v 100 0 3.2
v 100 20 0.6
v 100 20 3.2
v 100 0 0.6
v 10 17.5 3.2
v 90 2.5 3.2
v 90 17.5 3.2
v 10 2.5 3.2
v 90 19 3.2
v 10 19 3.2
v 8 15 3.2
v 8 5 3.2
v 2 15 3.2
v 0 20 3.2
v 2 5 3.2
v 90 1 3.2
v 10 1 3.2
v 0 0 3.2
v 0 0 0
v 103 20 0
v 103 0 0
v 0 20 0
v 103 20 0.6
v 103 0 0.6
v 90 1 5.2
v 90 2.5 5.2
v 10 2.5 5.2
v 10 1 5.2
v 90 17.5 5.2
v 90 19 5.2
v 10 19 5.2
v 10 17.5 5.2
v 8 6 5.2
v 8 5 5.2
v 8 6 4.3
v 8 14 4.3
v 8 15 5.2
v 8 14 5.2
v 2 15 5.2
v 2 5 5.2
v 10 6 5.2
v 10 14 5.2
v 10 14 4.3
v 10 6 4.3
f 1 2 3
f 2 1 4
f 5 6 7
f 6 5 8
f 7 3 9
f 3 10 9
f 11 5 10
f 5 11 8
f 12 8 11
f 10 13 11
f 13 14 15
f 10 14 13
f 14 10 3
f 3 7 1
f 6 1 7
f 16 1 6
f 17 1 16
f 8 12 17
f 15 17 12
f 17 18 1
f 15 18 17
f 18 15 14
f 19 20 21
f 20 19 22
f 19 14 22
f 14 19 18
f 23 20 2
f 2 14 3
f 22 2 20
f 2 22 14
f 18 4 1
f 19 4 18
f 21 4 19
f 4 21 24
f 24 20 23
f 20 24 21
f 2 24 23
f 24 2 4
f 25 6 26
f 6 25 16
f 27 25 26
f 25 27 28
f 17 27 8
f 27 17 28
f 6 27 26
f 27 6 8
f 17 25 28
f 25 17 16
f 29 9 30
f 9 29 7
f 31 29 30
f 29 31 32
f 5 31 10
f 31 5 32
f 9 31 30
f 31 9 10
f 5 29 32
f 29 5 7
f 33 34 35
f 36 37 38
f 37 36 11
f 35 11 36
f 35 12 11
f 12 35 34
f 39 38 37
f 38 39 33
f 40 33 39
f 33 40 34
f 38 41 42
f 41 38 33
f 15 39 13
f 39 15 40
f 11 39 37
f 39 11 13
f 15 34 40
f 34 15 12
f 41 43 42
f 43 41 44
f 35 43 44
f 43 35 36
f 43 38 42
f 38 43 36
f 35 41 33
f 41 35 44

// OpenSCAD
// Bag clip with living hinge - PETG, 0.4mm nozzle, no supports
// Printed open flat (two arms end-to-end), closes by folding 180deg about Y.
// Lower arm at origin, upper arm local origin at its hinge edge.

part = "arm_lower"; // [arm_lower, arm_upper, assembly]
cadverify_only = "";

/* Dimensions (mm) */
Lbody = 100;      // arm body length
Wbody = 20;       // arm width
Tbody = 3.2;      // arm thickness
Hhinge = 6;       // total hinge length (gap between bodies)
Hhalf = 3;        // hinge half length per arm
Thinge = 0.6;     // hinge thickness
Bgap = 2.0;       // bag thickness / closed gap
Ttot = Tbody + Bgap; // 5.2 closed inner top
Zpiv = Tbody + Bgap/2; // 4.2 pivot height
Xpiv = Lbody + Hhalf;  // 103 pivot X in assembly

module instance(name, part, unit = 1) {
    echo(cadverify_instance = [name, part, unit]);
    if (cadverify_only == "" || cadverify_only == name) children();
}

// ---------- lower arm geometry (print orientation, min at 0) ----------
module arm_lower() {
    // body
    cube([Lbody, Wbody, Tbody], false);
    // hinge half (thin, on bed), overlap 0.1 into body
    translate([Lbody-0.1, 0, 0])
        cube([Hhalf+0.1, Wbody, Thinge], false);
    // ribs (2mm tall standoff), overlap 0.1 into body
    translate([10, 1, Tbody-0.1])
        cube([80, 1.5, Bgap+0.1], false);
    translate([10, 17.5, Tbody-0.1])
        cube([80, 1.5, Bgap+0.1], false);
    // latch tower, overlap into body
    translate([2, 5, Tbody-0.1])
        cube([6, 10, Bgap+0.1], false);
    // latch lip (cantilever +X), overlap into tower
    translate([7.9, 6, 4.3])
        cube([2.1, 8, 0.9], false);
}

// ---------- upper arm geometry (print orientation, hinge at x=0) ----------
module arm_upper() {
    // hinge half on bed
    cube([Hhalf+0.1, Wbody, Thinge], false);
    // body, overlap into hinge
    translate([Hhalf-0.1, 0, 0])
        cube([Lbody+0.1, Wbody, Tbody], false);
    // latch tower (maps to closed x=12-18), overlap into body
    translate([85, 5, Tbody-0.1])
        cube([6, 10, Bgap+0.1], false);
    // latch lip (extends +X toward free end), overlap into tower
    translate([91, 6, 4.2])
        cube([2.8, 8, 1.0], false);
    // thumb tab beyond free end, same thickness as body, overlap
    translate([102.9, 6, 0])
        cube([8.1, 8, Tbody], false);
}

// ---------- part / assembly dispatch ----------
if (part == "arm_lower") {
    echo(cadverify_spec = [
        ["bounds", [[0, 0, 0], [103, 20, 5.2]]],
        ["bodies", 1],
        ["through_holes", 0],
        ["support_faces", [["bed", "-z", 1500]]],
        ["overhangs_allowed", [["latch lip", [[7.5, 5.5, 4.0], [10.5, 14.5, 5.5]]]]],
        ["copies", 1],
        ["details", [
            ["arm", "material", [[10, 5, 0.5], [90, 15, 2.7]], 1],
            ["arm_wall", "thickness", [50, 10, 10], [0, 0, -1], 3.2],
            ["hinge", "thickness", [101.5, 10, 5], [0, 0, -1], 0.6],
            ["rib", "material", [[20, 1.2, 3.5], [80, 2.3, 5.0]], 1],
            ["latch_tower", "material", [[3, 6, 3.5], [7, 14, 5.0]], 1],
            ["latch_lip", "material", [[8.5, 7, 4.5], [9.5, 13, 5.0]], 1],
            ["bag_slot", "void", [[20, 3, 3.5], [80, 17, 5.0]], 1]
        ]]
    ]);
    arm_lower();
} else if (part == "arm_upper") {
    echo(cadverify_spec = [
        ["bounds", [[0, 0, 0], [111, 20, 5.2]]],
        ["bodies", 1],
        ["through_holes", 0],
        ["support_faces", [["bed", "-z", 1500]]],
        ["overhangs_allowed", [["latch lip", [[90.5, 5.5, 4.0], [94.5, 14.5, 5.5]]]]],
        ["copies", 1],
        ["details", [
            ["arm", "material", [[10, 5, 0.5], [80, 15, 2.7]], 1],
            ["arm_wall", "thickness", [50, 10, 10], [0, 0, -1], 3.2],
            ["hinge", "thickness", [1.5, 10, 5], [0, 0, -1], 0.6],
            ["latch_tower", "material", [[86, 6, 3.5], [90, 14, 5.0]], 1],
            ["latch_lip", "material", [[91.5, 7, 4.4], [93.5, 13, 5.0]], 1],
            ["thumb_tab", "material", [[104, 7, 0.5], [110, 13, 2.7]], 1],
            ["field", "void", [[10, 3, 3.5], [80, 17, 5.0]], 1]
        ]]
    ]);
    arm_upper();
} else if (part == "assembly") {
    echo(cadverify_spec = [
        ["bounds", [[0, 0, 0], [214, 20, 5.2]]],
        ["support_faces", [["bed", "-z", 3000]]],
        ["motions", [
            ["close", ["upper"], "rotate", [103, 10, 4.2], [0, -1, 0], [0, 180],
                ["flex", [["upper", "lower", 1.0, "latch snap"]]],
                ["stops", [180]]
            ]
        ]],
        ["assembly_order", [
            [["lower"], [0, 0, 0]],
            [["upper"], [0, 0, -1]]
        ]]
    ]);
    instance("lower", "arm_lower") arm_lower();
    instance("upper", "arm_upper") translate([103, 0, 0]) arm_upper();
}
